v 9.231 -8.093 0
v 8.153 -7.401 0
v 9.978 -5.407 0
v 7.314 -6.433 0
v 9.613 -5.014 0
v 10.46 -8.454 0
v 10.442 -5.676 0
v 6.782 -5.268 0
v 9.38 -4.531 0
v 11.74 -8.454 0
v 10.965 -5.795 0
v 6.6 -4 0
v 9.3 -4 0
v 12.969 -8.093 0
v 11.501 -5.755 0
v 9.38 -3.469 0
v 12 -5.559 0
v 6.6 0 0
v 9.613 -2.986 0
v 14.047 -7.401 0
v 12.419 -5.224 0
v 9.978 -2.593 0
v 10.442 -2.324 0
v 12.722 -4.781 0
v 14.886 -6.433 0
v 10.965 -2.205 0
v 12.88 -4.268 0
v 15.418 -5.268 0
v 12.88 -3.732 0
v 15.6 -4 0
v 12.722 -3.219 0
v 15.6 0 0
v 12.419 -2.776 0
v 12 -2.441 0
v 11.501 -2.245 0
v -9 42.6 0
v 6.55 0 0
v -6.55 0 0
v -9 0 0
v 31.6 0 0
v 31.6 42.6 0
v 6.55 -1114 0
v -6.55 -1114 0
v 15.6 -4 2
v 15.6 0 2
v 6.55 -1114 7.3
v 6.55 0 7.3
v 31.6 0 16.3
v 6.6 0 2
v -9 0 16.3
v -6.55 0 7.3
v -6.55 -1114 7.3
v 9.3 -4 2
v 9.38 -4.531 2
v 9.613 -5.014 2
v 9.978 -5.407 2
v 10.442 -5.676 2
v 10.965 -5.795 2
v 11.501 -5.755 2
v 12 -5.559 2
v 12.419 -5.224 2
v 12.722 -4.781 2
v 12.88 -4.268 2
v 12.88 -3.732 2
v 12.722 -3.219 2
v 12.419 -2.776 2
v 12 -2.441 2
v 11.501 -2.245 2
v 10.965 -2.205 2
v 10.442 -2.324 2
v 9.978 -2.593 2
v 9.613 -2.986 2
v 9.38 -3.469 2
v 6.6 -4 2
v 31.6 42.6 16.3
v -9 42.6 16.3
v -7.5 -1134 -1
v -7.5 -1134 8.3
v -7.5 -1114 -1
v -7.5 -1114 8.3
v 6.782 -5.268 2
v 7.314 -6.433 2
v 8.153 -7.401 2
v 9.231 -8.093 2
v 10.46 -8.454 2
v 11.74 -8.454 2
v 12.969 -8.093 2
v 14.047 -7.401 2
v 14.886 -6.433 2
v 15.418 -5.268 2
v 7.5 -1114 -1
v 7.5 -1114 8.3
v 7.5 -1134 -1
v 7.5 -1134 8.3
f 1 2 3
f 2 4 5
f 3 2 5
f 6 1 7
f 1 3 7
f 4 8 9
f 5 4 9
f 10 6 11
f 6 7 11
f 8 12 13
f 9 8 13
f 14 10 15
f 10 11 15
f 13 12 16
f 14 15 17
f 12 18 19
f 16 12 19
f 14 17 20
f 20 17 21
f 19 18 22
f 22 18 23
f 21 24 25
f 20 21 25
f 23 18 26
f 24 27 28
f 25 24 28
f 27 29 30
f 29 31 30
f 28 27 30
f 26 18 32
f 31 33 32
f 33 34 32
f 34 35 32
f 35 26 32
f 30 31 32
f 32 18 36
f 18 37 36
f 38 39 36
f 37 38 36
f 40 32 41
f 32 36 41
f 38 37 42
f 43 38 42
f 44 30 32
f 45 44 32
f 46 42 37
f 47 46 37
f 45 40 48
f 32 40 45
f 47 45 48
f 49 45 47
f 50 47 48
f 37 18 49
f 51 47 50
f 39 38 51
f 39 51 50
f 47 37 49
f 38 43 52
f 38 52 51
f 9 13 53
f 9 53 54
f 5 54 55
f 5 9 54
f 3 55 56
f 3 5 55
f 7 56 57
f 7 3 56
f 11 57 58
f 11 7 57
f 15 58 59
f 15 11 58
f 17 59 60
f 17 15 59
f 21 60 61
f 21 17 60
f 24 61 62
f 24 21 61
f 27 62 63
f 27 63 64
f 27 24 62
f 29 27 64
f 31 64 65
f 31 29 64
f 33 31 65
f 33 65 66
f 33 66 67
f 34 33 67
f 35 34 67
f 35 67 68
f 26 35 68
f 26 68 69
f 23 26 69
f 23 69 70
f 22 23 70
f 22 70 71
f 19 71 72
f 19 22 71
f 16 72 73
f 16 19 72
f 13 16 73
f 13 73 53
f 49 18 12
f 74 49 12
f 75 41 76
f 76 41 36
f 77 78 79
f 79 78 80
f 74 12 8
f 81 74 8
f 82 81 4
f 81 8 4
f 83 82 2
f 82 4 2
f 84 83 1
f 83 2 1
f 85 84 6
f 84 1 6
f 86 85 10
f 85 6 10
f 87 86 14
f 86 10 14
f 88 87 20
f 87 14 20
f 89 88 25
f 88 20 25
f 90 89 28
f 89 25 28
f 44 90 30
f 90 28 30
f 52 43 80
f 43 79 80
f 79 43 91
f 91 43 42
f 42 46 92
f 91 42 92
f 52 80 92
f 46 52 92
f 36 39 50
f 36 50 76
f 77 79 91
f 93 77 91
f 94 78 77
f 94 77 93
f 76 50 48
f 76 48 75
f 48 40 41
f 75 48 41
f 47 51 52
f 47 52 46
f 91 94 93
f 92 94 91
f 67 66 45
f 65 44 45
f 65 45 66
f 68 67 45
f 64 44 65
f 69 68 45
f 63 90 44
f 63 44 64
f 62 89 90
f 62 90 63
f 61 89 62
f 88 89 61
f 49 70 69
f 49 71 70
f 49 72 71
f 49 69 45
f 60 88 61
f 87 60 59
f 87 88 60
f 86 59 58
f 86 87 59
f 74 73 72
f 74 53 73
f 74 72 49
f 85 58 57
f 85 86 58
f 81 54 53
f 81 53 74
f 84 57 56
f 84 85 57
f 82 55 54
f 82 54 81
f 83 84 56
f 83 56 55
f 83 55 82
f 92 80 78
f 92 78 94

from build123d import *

# Parameters (mm, degrees)
BINDER_W          = 42.6
BINDER_H          = 40.6
PAD002_DEPTH      = 16.3
SKETCH_R          = 1.8
PAD_DEPTH         = 2
SKETCH003_W       = 13.1
SKETCH003_H       = 1114
PAD001_DEPTH      = 7.3
SKETCH004_W       = 15
SKETCH004_H       = 20
PAD003_DEPTH      = 8.3
PAD003_DEPTH_BACK = 1


with BuildPart() as part:
    # Binder → Pad002 (new body)
    with BuildSketch(Plane(origin=(11.3, 21.3, 0), x_dir=(0, 1, 0), z_dir=(0, 0, 1))):
        Rectangle(BINDER_W, BINDER_H)
    extrude(amount=PAD002_DEPTH)

    # Sketch → Pad (join)
    with BuildSketch(Plane(origin=(11.1, 0, 0), x_dir=(-1, 0, 0), z_dir=(0, 0, 1))):
        with BuildLine():
            ThreePointArc((4.5, 4), (0, 8.5), (-4.5, 4))
            Line((-4.5, 4), (-4.5, 0))
            Line((-4.5, 0), (4.5, 0))
            Line((4.5, 0), (4.5, 4))
        make_face()
        with Locations((0, 4)):
            Circle(SKETCH_R, mode=Mode.SUBTRACT)
    extrude(amount=PAD_DEPTH)

    # Sketch003 → Pad001 (join)
    with BuildSketch(Plane.XY):
        with Locations((0, -557)):
            Rectangle(SKETCH003_W, SKETCH003_H)
    extrude(amount=PAD001_DEPTH)

    # Sketch004 → Pad003 (join, two sides)
    with BuildSketch(Plane.XY) as pad003_sk:
        with Locations((0, -1124)):
            Rectangle(SKETCH004_W, SKETCH004_H)
    extrude(amount=PAD003_DEPTH)
    extrude(pad003_sk.sketch, amount=-PAD003_DEPTH_BACK)


solid = part.part
